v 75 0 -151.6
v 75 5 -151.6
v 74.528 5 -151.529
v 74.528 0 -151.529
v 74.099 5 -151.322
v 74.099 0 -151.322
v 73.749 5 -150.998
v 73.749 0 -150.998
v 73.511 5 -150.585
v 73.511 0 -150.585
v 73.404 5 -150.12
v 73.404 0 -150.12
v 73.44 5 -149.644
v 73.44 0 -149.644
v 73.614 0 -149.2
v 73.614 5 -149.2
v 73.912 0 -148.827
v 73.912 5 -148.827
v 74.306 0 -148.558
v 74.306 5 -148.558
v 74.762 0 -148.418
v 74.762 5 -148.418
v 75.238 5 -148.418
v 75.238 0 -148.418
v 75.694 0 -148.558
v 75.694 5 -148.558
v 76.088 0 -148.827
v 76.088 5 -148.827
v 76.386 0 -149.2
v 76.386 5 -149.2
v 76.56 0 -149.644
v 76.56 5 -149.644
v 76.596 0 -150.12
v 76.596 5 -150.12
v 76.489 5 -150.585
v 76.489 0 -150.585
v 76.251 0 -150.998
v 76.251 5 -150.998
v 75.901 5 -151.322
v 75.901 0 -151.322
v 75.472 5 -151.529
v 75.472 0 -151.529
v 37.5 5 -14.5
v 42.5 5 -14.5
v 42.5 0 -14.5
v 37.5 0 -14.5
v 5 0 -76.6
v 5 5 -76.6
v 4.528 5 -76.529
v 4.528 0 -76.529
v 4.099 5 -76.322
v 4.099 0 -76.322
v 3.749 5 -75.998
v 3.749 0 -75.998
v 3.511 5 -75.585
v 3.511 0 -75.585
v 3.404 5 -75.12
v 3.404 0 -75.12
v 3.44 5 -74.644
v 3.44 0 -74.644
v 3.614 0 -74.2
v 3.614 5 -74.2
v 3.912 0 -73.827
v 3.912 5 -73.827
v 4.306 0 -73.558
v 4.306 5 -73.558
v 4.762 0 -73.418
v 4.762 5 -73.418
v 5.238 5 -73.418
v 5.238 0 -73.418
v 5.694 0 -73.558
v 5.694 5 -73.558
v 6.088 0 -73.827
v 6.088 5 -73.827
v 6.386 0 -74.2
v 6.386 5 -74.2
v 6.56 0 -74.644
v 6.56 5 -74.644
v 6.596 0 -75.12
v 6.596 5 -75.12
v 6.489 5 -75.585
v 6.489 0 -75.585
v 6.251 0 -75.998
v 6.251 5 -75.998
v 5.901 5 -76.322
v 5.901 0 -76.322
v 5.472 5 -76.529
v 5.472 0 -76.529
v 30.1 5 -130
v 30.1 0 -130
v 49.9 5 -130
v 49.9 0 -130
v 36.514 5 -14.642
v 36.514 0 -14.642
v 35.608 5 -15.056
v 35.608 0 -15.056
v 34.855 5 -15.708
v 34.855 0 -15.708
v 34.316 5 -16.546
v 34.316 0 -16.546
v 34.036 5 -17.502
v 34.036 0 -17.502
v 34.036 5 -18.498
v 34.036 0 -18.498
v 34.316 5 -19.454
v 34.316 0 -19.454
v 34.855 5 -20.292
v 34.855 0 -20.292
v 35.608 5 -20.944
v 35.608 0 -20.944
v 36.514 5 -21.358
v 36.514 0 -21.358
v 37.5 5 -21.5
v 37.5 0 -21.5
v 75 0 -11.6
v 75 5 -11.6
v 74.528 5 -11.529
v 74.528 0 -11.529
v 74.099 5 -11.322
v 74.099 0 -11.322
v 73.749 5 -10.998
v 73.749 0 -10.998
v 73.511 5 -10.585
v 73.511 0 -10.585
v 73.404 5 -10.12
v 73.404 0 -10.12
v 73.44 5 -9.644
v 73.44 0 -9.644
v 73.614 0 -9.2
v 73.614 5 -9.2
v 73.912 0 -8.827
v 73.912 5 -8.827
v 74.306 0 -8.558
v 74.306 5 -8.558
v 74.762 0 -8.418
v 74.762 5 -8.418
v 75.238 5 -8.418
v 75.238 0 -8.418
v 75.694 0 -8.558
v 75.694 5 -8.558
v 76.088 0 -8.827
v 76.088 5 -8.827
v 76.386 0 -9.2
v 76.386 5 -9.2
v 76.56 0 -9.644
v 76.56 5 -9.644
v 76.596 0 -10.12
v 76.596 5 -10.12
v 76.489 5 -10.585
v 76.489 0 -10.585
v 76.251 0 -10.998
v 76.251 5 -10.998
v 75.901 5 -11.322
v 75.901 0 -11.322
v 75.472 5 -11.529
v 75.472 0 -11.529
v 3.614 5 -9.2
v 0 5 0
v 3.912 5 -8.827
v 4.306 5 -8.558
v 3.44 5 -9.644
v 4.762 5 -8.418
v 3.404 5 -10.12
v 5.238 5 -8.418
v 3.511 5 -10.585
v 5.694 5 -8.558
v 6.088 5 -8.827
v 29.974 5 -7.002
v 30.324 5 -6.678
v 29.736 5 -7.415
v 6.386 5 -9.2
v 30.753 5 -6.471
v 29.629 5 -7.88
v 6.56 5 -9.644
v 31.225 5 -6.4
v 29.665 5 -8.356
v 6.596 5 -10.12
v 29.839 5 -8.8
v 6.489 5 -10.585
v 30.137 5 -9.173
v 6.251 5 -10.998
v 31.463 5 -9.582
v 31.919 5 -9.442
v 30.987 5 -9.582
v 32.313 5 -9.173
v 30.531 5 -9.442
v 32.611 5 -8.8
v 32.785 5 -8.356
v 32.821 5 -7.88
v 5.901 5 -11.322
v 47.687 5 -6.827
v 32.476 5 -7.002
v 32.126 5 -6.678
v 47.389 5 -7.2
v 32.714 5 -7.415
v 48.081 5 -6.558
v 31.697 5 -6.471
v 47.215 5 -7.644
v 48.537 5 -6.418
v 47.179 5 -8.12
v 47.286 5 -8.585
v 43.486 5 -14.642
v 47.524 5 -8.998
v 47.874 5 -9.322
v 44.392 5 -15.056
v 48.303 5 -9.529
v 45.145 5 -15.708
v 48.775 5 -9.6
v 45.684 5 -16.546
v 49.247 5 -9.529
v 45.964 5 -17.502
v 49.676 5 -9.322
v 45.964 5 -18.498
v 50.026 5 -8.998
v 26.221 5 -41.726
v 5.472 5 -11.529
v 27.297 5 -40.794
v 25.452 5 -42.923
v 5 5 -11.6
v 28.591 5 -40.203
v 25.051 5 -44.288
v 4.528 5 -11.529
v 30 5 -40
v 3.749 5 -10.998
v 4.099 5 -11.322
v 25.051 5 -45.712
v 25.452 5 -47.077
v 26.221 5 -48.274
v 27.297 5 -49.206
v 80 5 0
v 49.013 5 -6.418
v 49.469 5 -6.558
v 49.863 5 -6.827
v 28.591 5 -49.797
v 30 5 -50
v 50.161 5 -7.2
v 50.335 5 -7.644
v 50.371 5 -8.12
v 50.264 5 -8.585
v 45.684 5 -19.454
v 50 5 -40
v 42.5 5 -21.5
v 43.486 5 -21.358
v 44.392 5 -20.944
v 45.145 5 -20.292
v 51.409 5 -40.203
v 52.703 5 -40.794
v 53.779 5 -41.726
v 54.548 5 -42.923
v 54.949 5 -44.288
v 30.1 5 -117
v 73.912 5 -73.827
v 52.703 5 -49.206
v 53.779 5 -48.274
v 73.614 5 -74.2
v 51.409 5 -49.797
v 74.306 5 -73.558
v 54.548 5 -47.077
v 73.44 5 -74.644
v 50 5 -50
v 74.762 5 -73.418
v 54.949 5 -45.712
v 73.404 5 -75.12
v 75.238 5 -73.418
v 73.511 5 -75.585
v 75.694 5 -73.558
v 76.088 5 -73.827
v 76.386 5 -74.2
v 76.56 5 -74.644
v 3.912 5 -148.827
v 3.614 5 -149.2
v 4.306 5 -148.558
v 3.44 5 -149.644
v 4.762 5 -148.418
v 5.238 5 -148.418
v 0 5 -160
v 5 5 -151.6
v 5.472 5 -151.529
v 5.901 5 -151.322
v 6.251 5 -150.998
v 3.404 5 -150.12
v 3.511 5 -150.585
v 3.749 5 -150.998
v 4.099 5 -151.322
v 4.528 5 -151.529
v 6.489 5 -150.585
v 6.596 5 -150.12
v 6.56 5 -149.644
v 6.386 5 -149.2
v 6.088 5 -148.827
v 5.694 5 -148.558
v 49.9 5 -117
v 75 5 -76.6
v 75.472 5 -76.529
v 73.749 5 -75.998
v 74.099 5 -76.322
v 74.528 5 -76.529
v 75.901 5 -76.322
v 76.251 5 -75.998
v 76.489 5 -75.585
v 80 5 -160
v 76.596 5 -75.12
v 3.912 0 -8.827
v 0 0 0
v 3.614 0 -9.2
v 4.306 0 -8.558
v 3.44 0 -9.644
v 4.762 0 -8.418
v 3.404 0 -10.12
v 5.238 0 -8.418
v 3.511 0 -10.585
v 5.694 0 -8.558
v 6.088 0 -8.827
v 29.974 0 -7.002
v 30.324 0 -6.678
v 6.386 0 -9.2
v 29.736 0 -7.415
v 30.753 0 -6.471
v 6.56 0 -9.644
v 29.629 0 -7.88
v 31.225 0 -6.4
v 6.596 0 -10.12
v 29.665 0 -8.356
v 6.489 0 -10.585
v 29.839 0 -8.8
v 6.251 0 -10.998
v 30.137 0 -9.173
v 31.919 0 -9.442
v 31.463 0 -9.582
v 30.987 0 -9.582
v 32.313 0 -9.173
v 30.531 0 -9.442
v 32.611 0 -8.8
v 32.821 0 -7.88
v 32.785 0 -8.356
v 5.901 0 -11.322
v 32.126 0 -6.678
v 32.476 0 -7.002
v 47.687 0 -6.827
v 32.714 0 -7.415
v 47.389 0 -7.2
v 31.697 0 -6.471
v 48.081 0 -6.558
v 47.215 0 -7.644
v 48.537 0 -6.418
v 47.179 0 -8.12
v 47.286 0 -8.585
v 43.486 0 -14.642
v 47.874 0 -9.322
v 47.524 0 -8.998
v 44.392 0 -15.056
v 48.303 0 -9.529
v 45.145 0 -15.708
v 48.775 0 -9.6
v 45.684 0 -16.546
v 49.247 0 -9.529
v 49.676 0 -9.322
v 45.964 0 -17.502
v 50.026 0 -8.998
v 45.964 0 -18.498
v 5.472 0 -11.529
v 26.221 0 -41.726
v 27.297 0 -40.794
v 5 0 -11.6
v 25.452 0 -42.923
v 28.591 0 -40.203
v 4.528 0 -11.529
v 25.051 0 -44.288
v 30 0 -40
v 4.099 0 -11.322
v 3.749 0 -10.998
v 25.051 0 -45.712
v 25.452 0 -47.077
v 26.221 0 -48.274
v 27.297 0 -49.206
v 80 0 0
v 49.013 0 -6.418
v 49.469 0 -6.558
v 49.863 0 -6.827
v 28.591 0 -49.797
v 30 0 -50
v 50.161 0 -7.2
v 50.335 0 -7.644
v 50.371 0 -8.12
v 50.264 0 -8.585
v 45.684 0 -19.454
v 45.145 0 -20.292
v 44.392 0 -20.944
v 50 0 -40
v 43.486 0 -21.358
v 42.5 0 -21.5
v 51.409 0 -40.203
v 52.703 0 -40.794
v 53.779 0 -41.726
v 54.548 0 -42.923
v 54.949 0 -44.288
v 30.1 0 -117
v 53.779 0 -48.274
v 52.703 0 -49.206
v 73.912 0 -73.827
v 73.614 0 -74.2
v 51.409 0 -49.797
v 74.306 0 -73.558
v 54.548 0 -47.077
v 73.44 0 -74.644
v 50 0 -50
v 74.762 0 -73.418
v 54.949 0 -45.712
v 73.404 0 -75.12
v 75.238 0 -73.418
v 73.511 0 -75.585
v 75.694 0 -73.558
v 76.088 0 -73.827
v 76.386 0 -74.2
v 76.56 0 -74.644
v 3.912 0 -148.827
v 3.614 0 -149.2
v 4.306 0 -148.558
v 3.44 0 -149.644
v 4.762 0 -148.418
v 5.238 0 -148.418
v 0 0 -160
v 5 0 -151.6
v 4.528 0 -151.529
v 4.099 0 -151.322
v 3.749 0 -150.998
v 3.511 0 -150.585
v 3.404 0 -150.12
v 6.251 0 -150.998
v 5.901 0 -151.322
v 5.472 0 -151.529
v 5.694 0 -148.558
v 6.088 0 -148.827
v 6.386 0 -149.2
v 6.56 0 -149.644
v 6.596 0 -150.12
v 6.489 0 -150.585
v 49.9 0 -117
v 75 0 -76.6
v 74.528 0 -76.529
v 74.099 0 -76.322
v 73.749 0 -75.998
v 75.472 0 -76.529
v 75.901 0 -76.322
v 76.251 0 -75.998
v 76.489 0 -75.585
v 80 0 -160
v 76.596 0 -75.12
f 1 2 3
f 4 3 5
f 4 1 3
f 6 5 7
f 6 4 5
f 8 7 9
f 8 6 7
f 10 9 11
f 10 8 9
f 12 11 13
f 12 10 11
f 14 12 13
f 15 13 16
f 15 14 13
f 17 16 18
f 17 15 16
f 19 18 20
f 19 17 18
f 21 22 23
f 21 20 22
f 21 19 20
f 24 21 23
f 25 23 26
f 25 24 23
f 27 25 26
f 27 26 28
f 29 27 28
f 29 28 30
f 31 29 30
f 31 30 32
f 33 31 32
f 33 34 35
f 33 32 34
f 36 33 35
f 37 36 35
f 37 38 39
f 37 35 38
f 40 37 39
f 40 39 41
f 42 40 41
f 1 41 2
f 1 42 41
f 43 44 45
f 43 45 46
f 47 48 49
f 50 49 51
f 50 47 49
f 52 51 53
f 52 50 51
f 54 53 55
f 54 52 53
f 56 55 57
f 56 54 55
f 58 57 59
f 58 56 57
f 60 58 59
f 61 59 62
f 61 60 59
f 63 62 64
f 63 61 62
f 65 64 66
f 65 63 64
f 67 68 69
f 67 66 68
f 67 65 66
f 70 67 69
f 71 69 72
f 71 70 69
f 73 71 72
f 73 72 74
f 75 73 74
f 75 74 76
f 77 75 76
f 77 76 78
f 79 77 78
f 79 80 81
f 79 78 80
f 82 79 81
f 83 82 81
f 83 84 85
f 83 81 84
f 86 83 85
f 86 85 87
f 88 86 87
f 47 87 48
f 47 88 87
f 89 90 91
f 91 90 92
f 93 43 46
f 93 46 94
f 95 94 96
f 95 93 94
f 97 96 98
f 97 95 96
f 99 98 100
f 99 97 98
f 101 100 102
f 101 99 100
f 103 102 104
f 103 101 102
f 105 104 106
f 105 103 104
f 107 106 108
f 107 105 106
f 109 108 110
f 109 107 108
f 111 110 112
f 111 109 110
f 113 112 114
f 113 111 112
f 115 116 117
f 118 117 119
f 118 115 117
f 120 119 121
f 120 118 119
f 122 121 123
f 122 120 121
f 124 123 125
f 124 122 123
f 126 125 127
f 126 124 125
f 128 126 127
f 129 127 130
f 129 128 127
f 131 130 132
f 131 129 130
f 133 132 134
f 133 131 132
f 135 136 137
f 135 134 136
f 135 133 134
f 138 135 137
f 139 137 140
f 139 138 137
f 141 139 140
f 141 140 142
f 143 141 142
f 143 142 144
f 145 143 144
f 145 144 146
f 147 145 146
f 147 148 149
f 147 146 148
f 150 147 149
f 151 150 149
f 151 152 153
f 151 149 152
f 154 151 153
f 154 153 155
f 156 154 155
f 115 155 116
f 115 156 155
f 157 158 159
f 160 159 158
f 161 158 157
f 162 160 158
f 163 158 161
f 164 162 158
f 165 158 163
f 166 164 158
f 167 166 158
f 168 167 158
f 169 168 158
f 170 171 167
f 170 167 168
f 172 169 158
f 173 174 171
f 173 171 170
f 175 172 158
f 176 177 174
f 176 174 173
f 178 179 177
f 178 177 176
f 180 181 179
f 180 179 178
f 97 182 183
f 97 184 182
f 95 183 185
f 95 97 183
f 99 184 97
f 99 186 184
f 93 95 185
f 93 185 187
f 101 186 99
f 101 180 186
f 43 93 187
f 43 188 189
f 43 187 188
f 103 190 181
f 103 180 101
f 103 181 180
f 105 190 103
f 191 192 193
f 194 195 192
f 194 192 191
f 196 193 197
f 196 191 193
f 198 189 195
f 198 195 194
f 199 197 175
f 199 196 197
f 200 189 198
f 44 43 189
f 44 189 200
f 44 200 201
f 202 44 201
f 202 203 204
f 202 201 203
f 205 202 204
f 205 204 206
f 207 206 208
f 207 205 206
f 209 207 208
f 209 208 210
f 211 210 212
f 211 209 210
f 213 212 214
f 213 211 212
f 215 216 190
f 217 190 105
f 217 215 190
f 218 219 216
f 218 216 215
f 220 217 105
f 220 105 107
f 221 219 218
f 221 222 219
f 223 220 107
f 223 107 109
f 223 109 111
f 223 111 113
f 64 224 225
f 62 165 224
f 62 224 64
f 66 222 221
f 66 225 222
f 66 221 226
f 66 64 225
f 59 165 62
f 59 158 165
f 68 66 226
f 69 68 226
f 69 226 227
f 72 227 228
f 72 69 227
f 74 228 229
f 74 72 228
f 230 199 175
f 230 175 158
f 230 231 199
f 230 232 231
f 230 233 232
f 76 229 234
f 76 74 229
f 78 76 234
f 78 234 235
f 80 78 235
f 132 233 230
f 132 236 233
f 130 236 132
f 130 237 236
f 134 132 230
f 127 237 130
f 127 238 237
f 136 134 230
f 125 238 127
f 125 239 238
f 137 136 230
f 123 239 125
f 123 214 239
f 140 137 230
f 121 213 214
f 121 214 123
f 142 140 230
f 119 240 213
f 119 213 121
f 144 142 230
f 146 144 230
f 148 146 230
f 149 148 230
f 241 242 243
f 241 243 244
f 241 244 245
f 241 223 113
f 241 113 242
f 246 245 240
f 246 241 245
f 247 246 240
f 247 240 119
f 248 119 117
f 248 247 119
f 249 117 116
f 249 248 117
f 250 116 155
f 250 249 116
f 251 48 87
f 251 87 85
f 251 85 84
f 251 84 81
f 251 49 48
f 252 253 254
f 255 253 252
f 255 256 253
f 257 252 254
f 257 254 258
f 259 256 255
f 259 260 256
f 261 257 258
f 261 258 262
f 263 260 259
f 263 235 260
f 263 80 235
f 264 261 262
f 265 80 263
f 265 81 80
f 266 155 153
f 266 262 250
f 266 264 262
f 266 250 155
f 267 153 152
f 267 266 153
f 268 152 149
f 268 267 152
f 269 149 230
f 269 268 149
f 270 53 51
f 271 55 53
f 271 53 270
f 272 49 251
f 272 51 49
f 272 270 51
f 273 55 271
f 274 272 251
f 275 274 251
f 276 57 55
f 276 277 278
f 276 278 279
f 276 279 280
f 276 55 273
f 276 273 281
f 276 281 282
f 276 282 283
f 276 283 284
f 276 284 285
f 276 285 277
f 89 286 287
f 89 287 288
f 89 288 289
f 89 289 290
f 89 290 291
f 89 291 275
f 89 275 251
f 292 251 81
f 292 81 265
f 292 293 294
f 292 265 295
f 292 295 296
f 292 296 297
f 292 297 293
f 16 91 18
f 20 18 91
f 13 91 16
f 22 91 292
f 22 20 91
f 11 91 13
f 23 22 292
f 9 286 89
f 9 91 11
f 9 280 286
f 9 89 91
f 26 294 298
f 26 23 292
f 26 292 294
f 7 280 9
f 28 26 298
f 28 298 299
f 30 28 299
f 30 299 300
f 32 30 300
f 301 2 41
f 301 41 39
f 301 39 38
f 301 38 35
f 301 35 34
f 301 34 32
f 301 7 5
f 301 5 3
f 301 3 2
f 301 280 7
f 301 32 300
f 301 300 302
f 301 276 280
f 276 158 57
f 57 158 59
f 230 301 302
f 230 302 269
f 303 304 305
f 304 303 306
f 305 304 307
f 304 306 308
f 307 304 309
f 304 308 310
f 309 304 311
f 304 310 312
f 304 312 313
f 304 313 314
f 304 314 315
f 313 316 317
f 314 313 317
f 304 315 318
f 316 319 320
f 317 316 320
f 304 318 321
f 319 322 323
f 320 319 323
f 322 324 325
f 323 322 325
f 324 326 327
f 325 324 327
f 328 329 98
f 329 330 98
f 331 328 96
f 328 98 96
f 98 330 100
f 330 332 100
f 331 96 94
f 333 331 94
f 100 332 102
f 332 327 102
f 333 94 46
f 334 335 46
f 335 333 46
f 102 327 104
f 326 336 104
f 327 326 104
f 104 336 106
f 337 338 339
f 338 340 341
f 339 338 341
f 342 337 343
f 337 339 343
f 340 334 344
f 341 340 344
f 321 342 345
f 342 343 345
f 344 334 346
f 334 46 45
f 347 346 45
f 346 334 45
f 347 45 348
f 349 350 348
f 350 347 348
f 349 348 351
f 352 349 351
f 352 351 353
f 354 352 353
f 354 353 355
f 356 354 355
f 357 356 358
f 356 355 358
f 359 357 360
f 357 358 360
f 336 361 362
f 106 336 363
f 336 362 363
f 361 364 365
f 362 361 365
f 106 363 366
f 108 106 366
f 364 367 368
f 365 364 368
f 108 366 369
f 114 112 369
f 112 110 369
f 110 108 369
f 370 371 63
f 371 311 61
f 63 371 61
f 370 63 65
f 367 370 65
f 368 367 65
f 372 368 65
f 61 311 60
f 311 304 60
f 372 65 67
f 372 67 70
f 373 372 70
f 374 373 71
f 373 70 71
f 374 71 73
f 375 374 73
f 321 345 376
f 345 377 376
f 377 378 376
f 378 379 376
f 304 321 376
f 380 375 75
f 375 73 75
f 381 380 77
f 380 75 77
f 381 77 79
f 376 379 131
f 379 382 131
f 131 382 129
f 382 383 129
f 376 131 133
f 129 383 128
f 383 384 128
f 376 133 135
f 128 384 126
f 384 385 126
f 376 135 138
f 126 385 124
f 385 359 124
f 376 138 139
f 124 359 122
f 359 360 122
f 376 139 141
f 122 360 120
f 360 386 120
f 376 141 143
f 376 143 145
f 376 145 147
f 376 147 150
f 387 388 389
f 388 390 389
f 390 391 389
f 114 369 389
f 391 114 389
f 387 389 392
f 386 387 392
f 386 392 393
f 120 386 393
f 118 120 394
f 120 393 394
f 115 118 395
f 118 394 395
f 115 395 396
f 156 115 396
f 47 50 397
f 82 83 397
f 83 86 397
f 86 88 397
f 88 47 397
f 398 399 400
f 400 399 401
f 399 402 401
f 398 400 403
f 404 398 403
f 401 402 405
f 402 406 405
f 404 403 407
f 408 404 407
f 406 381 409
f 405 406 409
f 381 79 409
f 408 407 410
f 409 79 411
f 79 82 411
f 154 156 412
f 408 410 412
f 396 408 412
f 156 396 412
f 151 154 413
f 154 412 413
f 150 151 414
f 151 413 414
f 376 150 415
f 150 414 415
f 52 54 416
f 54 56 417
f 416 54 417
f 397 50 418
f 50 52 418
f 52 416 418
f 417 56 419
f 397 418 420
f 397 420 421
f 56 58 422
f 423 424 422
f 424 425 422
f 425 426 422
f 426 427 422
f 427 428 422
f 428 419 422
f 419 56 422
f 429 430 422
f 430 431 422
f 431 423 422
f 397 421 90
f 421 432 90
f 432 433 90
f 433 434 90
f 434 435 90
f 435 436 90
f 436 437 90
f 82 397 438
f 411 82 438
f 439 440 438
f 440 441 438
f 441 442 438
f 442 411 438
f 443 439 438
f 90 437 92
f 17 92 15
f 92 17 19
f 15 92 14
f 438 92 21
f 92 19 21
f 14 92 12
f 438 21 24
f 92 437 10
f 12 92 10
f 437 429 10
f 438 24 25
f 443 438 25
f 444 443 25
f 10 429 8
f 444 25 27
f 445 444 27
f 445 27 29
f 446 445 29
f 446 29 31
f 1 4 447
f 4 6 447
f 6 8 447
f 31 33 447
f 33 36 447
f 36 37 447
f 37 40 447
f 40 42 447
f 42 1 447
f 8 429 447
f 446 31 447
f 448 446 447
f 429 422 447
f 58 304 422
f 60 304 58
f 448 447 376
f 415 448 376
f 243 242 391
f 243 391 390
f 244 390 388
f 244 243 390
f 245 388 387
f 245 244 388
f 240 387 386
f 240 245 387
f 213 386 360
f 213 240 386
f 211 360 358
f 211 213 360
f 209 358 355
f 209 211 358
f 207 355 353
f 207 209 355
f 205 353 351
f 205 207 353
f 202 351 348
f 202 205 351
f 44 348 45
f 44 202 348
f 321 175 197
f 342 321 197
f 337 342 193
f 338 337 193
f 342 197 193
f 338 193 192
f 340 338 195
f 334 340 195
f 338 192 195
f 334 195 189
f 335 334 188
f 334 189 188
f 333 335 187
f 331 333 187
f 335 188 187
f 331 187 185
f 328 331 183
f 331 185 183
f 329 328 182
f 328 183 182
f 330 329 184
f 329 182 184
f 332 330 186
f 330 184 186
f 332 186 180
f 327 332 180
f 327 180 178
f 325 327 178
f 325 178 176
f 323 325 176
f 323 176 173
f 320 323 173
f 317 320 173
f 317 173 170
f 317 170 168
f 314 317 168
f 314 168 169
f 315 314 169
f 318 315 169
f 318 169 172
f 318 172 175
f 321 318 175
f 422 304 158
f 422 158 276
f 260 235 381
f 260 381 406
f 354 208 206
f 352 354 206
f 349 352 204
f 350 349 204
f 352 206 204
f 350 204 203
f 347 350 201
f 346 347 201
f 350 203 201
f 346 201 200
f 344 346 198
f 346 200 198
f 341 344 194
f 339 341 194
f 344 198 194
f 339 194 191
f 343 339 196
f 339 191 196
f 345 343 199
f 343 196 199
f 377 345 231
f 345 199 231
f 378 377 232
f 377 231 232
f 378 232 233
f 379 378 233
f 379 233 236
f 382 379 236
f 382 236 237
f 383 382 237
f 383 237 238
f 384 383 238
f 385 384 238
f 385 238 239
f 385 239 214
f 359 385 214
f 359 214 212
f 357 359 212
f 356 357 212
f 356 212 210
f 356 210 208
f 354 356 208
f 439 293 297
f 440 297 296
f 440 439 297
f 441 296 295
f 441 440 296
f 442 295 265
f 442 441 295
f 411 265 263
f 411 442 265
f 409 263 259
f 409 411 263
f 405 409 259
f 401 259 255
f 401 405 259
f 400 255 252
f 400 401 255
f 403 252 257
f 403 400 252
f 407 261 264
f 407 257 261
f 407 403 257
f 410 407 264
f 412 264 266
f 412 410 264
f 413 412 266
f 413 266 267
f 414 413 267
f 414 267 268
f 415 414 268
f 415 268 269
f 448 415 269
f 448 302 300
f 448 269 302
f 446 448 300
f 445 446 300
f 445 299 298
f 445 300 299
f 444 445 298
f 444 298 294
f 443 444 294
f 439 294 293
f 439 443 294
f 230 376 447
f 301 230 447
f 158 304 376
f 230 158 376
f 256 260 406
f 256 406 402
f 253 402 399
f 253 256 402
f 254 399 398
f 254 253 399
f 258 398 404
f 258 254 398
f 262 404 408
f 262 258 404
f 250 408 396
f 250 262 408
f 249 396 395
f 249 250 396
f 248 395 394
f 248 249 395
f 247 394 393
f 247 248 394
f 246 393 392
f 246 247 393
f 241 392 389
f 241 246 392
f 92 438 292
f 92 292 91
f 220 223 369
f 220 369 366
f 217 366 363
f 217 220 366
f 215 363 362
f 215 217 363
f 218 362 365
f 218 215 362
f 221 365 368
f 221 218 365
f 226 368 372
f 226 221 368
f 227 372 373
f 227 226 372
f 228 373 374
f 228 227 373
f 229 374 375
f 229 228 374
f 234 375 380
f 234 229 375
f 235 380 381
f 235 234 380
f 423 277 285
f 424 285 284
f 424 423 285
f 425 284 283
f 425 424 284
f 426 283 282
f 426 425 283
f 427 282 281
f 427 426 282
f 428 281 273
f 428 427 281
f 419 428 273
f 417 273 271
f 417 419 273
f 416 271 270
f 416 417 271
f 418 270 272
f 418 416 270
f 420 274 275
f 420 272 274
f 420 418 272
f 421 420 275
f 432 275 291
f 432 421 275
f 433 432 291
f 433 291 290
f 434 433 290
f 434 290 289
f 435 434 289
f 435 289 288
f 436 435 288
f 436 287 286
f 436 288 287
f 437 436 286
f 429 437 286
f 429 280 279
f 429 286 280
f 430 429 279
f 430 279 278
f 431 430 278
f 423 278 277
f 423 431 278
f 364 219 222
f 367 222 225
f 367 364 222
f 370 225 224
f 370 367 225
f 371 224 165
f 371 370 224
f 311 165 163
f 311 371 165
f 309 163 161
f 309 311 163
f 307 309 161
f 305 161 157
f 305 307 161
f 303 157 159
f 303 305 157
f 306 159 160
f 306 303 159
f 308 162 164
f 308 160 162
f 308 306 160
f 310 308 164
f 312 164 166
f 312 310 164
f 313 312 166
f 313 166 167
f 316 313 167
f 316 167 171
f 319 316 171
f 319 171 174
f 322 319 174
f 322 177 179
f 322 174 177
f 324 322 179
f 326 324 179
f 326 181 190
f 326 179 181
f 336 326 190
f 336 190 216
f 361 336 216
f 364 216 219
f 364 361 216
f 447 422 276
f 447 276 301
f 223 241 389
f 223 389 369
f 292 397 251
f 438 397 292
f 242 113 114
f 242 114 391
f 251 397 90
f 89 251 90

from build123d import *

# Parameters (mm, degrees)
ESQUISSE1_W              = 80
ESQUISSE1_H              = 160
BOSS_EXTRU_1_DEPTH       = 5
ESQUISSE2_R              = 1.6
ENL_V_MAT_EXTRU_8_DEPTH  = 10
ESQUISSE3_W              = 19.8
ESQUISSE3_H              = 13
ENL_V_MAT_EXTRU_9_DEPTH  = 10
ESQUISSE4_R              = 1.6
ENL_V_MAT_EXTRU_10_DEPTH = 10
ENL_V_MAT_EXTRU_11_DEPTH = 179.955301682
ENL_V_MAT_EXTRU_12_DEPTH = 179.955301682


with BuildPart() as part:
    # Esquisse1 → Boss.-Extru.1 (new body)
    with BuildSketch(Plane(origin=(0, 0, 0), x_dir=(1, 0, 0), z_dir=(0, 1, 0))):
        with Locations((40, 80)):
            Rectangle(ESQUISSE1_W, ESQUISSE1_H)
    extrude(amount=BOSS_EXTRU_1_DEPTH)

    # Esquisse2 → Enlèv. mat.-Extru.8 (cut)
    with BuildSketch(Plane(origin=(0, 0, 0), x_dir=(1, 0, 0), z_dir=(0, 1, 0))):
        with Locations(Location((5, 150, 0), (0, 0, 90))):
            Circle(ESQUISSE2_R)
        with Locations(Location((5, 75, 0), (0, 0, 90))):
            Circle(ESQUISSE2_R)
        with Locations(Location((5, 10, 0), (0, 0, 90))):
            Circle(ESQUISSE2_R)
        with Locations(Location((75, 10, 0), (0, 0, 90))):
            Circle(ESQUISSE2_R)
        with Locations(Location((75, 75, 0), (0, 0, 90))):
            Circle(ESQUISSE2_R)
        with Locations(Location((75, 150, 0), (0, 0, 90))):
            Circle(ESQUISSE2_R)
    extrude(amount=ENL_V_MAT_EXTRU_8_DEPTH, mode=Mode.SUBTRACT)

    # Esquisse3 → Enlèv. mat.-Extru.9 (cut)
    with BuildSketch(Plane(origin=(0, 0, 0), x_dir=(1, 0, 0), z_dir=(0, 1, 0))):
        with Locations((40, 123.5)):
            Rectangle(ESQUISSE3_W, ESQUISSE3_H)
    extrude(amount=ENL_V_MAT_EXTRU_9_DEPTH, mode=Mode.SUBTRACT)

    # Esquisse4 → Enlèv. mat.-Extru.10 (cut)
    with BuildSketch(Plane(origin=(0, 5, 0), x_dir=(1, 0, 0), z_dir=(0, 1, 0))):
        with Locations(Location((31.225, 8, 0), (0, 0, 270))):
            Circle(ESQUISSE4_R)
        with Locations(Location((48.775, 8, 0), (0, 0, 90))):
            Circle(ESQUISSE4_R)
    extrude(amount=-ENL_V_MAT_EXTRU_10_DEPTH, mode=Mode.SUBTRACT)

    # Esquisse5 → Enlèv. mat.-Extru.11 (cut, through all)
    with BuildSketch(Plane(origin=(0, 5, 0), x_dir=(1, 0, 0), z_dir=(0, 1, 0))):
        with BuildLine():
            Line((37.5, 21.5), (42.5, 21.5))
            ThreePointArc((42.5, 21.5), (46, 18), (42.5, 14.5))
            Line((42.5, 14.5), (37.5, 14.5))
            ThreePointArc((37.5, 14.5), (34, 18), (37.5, 21.5))
        make_face()
    extrude(amount=-ENL_V_MAT_EXTRU_11_DEPTH, mode=Mode.SUBTRACT)

    # Esquisse6 → Enlèv. mat.-Extru.12 (cut, through all)
    with BuildSketch(Plane(origin=(0, 5, 0), x_dir=(1, 0, 0), z_dir=(0, 1, 0))):
        with BuildLine():
            Line((30, 50), (50, 50))
            ThreePointArc((50, 50), (55, 45), (50, 40))
            Line((50, 40), (30, 40))
            ThreePointArc((30, 40), (25, 45), (30, 50))
        make_face()
    extrude(amount=-ENL_V_MAT_EXTRU_12_DEPTH, mode=Mode.SUBTRACT)


solid = part.part
